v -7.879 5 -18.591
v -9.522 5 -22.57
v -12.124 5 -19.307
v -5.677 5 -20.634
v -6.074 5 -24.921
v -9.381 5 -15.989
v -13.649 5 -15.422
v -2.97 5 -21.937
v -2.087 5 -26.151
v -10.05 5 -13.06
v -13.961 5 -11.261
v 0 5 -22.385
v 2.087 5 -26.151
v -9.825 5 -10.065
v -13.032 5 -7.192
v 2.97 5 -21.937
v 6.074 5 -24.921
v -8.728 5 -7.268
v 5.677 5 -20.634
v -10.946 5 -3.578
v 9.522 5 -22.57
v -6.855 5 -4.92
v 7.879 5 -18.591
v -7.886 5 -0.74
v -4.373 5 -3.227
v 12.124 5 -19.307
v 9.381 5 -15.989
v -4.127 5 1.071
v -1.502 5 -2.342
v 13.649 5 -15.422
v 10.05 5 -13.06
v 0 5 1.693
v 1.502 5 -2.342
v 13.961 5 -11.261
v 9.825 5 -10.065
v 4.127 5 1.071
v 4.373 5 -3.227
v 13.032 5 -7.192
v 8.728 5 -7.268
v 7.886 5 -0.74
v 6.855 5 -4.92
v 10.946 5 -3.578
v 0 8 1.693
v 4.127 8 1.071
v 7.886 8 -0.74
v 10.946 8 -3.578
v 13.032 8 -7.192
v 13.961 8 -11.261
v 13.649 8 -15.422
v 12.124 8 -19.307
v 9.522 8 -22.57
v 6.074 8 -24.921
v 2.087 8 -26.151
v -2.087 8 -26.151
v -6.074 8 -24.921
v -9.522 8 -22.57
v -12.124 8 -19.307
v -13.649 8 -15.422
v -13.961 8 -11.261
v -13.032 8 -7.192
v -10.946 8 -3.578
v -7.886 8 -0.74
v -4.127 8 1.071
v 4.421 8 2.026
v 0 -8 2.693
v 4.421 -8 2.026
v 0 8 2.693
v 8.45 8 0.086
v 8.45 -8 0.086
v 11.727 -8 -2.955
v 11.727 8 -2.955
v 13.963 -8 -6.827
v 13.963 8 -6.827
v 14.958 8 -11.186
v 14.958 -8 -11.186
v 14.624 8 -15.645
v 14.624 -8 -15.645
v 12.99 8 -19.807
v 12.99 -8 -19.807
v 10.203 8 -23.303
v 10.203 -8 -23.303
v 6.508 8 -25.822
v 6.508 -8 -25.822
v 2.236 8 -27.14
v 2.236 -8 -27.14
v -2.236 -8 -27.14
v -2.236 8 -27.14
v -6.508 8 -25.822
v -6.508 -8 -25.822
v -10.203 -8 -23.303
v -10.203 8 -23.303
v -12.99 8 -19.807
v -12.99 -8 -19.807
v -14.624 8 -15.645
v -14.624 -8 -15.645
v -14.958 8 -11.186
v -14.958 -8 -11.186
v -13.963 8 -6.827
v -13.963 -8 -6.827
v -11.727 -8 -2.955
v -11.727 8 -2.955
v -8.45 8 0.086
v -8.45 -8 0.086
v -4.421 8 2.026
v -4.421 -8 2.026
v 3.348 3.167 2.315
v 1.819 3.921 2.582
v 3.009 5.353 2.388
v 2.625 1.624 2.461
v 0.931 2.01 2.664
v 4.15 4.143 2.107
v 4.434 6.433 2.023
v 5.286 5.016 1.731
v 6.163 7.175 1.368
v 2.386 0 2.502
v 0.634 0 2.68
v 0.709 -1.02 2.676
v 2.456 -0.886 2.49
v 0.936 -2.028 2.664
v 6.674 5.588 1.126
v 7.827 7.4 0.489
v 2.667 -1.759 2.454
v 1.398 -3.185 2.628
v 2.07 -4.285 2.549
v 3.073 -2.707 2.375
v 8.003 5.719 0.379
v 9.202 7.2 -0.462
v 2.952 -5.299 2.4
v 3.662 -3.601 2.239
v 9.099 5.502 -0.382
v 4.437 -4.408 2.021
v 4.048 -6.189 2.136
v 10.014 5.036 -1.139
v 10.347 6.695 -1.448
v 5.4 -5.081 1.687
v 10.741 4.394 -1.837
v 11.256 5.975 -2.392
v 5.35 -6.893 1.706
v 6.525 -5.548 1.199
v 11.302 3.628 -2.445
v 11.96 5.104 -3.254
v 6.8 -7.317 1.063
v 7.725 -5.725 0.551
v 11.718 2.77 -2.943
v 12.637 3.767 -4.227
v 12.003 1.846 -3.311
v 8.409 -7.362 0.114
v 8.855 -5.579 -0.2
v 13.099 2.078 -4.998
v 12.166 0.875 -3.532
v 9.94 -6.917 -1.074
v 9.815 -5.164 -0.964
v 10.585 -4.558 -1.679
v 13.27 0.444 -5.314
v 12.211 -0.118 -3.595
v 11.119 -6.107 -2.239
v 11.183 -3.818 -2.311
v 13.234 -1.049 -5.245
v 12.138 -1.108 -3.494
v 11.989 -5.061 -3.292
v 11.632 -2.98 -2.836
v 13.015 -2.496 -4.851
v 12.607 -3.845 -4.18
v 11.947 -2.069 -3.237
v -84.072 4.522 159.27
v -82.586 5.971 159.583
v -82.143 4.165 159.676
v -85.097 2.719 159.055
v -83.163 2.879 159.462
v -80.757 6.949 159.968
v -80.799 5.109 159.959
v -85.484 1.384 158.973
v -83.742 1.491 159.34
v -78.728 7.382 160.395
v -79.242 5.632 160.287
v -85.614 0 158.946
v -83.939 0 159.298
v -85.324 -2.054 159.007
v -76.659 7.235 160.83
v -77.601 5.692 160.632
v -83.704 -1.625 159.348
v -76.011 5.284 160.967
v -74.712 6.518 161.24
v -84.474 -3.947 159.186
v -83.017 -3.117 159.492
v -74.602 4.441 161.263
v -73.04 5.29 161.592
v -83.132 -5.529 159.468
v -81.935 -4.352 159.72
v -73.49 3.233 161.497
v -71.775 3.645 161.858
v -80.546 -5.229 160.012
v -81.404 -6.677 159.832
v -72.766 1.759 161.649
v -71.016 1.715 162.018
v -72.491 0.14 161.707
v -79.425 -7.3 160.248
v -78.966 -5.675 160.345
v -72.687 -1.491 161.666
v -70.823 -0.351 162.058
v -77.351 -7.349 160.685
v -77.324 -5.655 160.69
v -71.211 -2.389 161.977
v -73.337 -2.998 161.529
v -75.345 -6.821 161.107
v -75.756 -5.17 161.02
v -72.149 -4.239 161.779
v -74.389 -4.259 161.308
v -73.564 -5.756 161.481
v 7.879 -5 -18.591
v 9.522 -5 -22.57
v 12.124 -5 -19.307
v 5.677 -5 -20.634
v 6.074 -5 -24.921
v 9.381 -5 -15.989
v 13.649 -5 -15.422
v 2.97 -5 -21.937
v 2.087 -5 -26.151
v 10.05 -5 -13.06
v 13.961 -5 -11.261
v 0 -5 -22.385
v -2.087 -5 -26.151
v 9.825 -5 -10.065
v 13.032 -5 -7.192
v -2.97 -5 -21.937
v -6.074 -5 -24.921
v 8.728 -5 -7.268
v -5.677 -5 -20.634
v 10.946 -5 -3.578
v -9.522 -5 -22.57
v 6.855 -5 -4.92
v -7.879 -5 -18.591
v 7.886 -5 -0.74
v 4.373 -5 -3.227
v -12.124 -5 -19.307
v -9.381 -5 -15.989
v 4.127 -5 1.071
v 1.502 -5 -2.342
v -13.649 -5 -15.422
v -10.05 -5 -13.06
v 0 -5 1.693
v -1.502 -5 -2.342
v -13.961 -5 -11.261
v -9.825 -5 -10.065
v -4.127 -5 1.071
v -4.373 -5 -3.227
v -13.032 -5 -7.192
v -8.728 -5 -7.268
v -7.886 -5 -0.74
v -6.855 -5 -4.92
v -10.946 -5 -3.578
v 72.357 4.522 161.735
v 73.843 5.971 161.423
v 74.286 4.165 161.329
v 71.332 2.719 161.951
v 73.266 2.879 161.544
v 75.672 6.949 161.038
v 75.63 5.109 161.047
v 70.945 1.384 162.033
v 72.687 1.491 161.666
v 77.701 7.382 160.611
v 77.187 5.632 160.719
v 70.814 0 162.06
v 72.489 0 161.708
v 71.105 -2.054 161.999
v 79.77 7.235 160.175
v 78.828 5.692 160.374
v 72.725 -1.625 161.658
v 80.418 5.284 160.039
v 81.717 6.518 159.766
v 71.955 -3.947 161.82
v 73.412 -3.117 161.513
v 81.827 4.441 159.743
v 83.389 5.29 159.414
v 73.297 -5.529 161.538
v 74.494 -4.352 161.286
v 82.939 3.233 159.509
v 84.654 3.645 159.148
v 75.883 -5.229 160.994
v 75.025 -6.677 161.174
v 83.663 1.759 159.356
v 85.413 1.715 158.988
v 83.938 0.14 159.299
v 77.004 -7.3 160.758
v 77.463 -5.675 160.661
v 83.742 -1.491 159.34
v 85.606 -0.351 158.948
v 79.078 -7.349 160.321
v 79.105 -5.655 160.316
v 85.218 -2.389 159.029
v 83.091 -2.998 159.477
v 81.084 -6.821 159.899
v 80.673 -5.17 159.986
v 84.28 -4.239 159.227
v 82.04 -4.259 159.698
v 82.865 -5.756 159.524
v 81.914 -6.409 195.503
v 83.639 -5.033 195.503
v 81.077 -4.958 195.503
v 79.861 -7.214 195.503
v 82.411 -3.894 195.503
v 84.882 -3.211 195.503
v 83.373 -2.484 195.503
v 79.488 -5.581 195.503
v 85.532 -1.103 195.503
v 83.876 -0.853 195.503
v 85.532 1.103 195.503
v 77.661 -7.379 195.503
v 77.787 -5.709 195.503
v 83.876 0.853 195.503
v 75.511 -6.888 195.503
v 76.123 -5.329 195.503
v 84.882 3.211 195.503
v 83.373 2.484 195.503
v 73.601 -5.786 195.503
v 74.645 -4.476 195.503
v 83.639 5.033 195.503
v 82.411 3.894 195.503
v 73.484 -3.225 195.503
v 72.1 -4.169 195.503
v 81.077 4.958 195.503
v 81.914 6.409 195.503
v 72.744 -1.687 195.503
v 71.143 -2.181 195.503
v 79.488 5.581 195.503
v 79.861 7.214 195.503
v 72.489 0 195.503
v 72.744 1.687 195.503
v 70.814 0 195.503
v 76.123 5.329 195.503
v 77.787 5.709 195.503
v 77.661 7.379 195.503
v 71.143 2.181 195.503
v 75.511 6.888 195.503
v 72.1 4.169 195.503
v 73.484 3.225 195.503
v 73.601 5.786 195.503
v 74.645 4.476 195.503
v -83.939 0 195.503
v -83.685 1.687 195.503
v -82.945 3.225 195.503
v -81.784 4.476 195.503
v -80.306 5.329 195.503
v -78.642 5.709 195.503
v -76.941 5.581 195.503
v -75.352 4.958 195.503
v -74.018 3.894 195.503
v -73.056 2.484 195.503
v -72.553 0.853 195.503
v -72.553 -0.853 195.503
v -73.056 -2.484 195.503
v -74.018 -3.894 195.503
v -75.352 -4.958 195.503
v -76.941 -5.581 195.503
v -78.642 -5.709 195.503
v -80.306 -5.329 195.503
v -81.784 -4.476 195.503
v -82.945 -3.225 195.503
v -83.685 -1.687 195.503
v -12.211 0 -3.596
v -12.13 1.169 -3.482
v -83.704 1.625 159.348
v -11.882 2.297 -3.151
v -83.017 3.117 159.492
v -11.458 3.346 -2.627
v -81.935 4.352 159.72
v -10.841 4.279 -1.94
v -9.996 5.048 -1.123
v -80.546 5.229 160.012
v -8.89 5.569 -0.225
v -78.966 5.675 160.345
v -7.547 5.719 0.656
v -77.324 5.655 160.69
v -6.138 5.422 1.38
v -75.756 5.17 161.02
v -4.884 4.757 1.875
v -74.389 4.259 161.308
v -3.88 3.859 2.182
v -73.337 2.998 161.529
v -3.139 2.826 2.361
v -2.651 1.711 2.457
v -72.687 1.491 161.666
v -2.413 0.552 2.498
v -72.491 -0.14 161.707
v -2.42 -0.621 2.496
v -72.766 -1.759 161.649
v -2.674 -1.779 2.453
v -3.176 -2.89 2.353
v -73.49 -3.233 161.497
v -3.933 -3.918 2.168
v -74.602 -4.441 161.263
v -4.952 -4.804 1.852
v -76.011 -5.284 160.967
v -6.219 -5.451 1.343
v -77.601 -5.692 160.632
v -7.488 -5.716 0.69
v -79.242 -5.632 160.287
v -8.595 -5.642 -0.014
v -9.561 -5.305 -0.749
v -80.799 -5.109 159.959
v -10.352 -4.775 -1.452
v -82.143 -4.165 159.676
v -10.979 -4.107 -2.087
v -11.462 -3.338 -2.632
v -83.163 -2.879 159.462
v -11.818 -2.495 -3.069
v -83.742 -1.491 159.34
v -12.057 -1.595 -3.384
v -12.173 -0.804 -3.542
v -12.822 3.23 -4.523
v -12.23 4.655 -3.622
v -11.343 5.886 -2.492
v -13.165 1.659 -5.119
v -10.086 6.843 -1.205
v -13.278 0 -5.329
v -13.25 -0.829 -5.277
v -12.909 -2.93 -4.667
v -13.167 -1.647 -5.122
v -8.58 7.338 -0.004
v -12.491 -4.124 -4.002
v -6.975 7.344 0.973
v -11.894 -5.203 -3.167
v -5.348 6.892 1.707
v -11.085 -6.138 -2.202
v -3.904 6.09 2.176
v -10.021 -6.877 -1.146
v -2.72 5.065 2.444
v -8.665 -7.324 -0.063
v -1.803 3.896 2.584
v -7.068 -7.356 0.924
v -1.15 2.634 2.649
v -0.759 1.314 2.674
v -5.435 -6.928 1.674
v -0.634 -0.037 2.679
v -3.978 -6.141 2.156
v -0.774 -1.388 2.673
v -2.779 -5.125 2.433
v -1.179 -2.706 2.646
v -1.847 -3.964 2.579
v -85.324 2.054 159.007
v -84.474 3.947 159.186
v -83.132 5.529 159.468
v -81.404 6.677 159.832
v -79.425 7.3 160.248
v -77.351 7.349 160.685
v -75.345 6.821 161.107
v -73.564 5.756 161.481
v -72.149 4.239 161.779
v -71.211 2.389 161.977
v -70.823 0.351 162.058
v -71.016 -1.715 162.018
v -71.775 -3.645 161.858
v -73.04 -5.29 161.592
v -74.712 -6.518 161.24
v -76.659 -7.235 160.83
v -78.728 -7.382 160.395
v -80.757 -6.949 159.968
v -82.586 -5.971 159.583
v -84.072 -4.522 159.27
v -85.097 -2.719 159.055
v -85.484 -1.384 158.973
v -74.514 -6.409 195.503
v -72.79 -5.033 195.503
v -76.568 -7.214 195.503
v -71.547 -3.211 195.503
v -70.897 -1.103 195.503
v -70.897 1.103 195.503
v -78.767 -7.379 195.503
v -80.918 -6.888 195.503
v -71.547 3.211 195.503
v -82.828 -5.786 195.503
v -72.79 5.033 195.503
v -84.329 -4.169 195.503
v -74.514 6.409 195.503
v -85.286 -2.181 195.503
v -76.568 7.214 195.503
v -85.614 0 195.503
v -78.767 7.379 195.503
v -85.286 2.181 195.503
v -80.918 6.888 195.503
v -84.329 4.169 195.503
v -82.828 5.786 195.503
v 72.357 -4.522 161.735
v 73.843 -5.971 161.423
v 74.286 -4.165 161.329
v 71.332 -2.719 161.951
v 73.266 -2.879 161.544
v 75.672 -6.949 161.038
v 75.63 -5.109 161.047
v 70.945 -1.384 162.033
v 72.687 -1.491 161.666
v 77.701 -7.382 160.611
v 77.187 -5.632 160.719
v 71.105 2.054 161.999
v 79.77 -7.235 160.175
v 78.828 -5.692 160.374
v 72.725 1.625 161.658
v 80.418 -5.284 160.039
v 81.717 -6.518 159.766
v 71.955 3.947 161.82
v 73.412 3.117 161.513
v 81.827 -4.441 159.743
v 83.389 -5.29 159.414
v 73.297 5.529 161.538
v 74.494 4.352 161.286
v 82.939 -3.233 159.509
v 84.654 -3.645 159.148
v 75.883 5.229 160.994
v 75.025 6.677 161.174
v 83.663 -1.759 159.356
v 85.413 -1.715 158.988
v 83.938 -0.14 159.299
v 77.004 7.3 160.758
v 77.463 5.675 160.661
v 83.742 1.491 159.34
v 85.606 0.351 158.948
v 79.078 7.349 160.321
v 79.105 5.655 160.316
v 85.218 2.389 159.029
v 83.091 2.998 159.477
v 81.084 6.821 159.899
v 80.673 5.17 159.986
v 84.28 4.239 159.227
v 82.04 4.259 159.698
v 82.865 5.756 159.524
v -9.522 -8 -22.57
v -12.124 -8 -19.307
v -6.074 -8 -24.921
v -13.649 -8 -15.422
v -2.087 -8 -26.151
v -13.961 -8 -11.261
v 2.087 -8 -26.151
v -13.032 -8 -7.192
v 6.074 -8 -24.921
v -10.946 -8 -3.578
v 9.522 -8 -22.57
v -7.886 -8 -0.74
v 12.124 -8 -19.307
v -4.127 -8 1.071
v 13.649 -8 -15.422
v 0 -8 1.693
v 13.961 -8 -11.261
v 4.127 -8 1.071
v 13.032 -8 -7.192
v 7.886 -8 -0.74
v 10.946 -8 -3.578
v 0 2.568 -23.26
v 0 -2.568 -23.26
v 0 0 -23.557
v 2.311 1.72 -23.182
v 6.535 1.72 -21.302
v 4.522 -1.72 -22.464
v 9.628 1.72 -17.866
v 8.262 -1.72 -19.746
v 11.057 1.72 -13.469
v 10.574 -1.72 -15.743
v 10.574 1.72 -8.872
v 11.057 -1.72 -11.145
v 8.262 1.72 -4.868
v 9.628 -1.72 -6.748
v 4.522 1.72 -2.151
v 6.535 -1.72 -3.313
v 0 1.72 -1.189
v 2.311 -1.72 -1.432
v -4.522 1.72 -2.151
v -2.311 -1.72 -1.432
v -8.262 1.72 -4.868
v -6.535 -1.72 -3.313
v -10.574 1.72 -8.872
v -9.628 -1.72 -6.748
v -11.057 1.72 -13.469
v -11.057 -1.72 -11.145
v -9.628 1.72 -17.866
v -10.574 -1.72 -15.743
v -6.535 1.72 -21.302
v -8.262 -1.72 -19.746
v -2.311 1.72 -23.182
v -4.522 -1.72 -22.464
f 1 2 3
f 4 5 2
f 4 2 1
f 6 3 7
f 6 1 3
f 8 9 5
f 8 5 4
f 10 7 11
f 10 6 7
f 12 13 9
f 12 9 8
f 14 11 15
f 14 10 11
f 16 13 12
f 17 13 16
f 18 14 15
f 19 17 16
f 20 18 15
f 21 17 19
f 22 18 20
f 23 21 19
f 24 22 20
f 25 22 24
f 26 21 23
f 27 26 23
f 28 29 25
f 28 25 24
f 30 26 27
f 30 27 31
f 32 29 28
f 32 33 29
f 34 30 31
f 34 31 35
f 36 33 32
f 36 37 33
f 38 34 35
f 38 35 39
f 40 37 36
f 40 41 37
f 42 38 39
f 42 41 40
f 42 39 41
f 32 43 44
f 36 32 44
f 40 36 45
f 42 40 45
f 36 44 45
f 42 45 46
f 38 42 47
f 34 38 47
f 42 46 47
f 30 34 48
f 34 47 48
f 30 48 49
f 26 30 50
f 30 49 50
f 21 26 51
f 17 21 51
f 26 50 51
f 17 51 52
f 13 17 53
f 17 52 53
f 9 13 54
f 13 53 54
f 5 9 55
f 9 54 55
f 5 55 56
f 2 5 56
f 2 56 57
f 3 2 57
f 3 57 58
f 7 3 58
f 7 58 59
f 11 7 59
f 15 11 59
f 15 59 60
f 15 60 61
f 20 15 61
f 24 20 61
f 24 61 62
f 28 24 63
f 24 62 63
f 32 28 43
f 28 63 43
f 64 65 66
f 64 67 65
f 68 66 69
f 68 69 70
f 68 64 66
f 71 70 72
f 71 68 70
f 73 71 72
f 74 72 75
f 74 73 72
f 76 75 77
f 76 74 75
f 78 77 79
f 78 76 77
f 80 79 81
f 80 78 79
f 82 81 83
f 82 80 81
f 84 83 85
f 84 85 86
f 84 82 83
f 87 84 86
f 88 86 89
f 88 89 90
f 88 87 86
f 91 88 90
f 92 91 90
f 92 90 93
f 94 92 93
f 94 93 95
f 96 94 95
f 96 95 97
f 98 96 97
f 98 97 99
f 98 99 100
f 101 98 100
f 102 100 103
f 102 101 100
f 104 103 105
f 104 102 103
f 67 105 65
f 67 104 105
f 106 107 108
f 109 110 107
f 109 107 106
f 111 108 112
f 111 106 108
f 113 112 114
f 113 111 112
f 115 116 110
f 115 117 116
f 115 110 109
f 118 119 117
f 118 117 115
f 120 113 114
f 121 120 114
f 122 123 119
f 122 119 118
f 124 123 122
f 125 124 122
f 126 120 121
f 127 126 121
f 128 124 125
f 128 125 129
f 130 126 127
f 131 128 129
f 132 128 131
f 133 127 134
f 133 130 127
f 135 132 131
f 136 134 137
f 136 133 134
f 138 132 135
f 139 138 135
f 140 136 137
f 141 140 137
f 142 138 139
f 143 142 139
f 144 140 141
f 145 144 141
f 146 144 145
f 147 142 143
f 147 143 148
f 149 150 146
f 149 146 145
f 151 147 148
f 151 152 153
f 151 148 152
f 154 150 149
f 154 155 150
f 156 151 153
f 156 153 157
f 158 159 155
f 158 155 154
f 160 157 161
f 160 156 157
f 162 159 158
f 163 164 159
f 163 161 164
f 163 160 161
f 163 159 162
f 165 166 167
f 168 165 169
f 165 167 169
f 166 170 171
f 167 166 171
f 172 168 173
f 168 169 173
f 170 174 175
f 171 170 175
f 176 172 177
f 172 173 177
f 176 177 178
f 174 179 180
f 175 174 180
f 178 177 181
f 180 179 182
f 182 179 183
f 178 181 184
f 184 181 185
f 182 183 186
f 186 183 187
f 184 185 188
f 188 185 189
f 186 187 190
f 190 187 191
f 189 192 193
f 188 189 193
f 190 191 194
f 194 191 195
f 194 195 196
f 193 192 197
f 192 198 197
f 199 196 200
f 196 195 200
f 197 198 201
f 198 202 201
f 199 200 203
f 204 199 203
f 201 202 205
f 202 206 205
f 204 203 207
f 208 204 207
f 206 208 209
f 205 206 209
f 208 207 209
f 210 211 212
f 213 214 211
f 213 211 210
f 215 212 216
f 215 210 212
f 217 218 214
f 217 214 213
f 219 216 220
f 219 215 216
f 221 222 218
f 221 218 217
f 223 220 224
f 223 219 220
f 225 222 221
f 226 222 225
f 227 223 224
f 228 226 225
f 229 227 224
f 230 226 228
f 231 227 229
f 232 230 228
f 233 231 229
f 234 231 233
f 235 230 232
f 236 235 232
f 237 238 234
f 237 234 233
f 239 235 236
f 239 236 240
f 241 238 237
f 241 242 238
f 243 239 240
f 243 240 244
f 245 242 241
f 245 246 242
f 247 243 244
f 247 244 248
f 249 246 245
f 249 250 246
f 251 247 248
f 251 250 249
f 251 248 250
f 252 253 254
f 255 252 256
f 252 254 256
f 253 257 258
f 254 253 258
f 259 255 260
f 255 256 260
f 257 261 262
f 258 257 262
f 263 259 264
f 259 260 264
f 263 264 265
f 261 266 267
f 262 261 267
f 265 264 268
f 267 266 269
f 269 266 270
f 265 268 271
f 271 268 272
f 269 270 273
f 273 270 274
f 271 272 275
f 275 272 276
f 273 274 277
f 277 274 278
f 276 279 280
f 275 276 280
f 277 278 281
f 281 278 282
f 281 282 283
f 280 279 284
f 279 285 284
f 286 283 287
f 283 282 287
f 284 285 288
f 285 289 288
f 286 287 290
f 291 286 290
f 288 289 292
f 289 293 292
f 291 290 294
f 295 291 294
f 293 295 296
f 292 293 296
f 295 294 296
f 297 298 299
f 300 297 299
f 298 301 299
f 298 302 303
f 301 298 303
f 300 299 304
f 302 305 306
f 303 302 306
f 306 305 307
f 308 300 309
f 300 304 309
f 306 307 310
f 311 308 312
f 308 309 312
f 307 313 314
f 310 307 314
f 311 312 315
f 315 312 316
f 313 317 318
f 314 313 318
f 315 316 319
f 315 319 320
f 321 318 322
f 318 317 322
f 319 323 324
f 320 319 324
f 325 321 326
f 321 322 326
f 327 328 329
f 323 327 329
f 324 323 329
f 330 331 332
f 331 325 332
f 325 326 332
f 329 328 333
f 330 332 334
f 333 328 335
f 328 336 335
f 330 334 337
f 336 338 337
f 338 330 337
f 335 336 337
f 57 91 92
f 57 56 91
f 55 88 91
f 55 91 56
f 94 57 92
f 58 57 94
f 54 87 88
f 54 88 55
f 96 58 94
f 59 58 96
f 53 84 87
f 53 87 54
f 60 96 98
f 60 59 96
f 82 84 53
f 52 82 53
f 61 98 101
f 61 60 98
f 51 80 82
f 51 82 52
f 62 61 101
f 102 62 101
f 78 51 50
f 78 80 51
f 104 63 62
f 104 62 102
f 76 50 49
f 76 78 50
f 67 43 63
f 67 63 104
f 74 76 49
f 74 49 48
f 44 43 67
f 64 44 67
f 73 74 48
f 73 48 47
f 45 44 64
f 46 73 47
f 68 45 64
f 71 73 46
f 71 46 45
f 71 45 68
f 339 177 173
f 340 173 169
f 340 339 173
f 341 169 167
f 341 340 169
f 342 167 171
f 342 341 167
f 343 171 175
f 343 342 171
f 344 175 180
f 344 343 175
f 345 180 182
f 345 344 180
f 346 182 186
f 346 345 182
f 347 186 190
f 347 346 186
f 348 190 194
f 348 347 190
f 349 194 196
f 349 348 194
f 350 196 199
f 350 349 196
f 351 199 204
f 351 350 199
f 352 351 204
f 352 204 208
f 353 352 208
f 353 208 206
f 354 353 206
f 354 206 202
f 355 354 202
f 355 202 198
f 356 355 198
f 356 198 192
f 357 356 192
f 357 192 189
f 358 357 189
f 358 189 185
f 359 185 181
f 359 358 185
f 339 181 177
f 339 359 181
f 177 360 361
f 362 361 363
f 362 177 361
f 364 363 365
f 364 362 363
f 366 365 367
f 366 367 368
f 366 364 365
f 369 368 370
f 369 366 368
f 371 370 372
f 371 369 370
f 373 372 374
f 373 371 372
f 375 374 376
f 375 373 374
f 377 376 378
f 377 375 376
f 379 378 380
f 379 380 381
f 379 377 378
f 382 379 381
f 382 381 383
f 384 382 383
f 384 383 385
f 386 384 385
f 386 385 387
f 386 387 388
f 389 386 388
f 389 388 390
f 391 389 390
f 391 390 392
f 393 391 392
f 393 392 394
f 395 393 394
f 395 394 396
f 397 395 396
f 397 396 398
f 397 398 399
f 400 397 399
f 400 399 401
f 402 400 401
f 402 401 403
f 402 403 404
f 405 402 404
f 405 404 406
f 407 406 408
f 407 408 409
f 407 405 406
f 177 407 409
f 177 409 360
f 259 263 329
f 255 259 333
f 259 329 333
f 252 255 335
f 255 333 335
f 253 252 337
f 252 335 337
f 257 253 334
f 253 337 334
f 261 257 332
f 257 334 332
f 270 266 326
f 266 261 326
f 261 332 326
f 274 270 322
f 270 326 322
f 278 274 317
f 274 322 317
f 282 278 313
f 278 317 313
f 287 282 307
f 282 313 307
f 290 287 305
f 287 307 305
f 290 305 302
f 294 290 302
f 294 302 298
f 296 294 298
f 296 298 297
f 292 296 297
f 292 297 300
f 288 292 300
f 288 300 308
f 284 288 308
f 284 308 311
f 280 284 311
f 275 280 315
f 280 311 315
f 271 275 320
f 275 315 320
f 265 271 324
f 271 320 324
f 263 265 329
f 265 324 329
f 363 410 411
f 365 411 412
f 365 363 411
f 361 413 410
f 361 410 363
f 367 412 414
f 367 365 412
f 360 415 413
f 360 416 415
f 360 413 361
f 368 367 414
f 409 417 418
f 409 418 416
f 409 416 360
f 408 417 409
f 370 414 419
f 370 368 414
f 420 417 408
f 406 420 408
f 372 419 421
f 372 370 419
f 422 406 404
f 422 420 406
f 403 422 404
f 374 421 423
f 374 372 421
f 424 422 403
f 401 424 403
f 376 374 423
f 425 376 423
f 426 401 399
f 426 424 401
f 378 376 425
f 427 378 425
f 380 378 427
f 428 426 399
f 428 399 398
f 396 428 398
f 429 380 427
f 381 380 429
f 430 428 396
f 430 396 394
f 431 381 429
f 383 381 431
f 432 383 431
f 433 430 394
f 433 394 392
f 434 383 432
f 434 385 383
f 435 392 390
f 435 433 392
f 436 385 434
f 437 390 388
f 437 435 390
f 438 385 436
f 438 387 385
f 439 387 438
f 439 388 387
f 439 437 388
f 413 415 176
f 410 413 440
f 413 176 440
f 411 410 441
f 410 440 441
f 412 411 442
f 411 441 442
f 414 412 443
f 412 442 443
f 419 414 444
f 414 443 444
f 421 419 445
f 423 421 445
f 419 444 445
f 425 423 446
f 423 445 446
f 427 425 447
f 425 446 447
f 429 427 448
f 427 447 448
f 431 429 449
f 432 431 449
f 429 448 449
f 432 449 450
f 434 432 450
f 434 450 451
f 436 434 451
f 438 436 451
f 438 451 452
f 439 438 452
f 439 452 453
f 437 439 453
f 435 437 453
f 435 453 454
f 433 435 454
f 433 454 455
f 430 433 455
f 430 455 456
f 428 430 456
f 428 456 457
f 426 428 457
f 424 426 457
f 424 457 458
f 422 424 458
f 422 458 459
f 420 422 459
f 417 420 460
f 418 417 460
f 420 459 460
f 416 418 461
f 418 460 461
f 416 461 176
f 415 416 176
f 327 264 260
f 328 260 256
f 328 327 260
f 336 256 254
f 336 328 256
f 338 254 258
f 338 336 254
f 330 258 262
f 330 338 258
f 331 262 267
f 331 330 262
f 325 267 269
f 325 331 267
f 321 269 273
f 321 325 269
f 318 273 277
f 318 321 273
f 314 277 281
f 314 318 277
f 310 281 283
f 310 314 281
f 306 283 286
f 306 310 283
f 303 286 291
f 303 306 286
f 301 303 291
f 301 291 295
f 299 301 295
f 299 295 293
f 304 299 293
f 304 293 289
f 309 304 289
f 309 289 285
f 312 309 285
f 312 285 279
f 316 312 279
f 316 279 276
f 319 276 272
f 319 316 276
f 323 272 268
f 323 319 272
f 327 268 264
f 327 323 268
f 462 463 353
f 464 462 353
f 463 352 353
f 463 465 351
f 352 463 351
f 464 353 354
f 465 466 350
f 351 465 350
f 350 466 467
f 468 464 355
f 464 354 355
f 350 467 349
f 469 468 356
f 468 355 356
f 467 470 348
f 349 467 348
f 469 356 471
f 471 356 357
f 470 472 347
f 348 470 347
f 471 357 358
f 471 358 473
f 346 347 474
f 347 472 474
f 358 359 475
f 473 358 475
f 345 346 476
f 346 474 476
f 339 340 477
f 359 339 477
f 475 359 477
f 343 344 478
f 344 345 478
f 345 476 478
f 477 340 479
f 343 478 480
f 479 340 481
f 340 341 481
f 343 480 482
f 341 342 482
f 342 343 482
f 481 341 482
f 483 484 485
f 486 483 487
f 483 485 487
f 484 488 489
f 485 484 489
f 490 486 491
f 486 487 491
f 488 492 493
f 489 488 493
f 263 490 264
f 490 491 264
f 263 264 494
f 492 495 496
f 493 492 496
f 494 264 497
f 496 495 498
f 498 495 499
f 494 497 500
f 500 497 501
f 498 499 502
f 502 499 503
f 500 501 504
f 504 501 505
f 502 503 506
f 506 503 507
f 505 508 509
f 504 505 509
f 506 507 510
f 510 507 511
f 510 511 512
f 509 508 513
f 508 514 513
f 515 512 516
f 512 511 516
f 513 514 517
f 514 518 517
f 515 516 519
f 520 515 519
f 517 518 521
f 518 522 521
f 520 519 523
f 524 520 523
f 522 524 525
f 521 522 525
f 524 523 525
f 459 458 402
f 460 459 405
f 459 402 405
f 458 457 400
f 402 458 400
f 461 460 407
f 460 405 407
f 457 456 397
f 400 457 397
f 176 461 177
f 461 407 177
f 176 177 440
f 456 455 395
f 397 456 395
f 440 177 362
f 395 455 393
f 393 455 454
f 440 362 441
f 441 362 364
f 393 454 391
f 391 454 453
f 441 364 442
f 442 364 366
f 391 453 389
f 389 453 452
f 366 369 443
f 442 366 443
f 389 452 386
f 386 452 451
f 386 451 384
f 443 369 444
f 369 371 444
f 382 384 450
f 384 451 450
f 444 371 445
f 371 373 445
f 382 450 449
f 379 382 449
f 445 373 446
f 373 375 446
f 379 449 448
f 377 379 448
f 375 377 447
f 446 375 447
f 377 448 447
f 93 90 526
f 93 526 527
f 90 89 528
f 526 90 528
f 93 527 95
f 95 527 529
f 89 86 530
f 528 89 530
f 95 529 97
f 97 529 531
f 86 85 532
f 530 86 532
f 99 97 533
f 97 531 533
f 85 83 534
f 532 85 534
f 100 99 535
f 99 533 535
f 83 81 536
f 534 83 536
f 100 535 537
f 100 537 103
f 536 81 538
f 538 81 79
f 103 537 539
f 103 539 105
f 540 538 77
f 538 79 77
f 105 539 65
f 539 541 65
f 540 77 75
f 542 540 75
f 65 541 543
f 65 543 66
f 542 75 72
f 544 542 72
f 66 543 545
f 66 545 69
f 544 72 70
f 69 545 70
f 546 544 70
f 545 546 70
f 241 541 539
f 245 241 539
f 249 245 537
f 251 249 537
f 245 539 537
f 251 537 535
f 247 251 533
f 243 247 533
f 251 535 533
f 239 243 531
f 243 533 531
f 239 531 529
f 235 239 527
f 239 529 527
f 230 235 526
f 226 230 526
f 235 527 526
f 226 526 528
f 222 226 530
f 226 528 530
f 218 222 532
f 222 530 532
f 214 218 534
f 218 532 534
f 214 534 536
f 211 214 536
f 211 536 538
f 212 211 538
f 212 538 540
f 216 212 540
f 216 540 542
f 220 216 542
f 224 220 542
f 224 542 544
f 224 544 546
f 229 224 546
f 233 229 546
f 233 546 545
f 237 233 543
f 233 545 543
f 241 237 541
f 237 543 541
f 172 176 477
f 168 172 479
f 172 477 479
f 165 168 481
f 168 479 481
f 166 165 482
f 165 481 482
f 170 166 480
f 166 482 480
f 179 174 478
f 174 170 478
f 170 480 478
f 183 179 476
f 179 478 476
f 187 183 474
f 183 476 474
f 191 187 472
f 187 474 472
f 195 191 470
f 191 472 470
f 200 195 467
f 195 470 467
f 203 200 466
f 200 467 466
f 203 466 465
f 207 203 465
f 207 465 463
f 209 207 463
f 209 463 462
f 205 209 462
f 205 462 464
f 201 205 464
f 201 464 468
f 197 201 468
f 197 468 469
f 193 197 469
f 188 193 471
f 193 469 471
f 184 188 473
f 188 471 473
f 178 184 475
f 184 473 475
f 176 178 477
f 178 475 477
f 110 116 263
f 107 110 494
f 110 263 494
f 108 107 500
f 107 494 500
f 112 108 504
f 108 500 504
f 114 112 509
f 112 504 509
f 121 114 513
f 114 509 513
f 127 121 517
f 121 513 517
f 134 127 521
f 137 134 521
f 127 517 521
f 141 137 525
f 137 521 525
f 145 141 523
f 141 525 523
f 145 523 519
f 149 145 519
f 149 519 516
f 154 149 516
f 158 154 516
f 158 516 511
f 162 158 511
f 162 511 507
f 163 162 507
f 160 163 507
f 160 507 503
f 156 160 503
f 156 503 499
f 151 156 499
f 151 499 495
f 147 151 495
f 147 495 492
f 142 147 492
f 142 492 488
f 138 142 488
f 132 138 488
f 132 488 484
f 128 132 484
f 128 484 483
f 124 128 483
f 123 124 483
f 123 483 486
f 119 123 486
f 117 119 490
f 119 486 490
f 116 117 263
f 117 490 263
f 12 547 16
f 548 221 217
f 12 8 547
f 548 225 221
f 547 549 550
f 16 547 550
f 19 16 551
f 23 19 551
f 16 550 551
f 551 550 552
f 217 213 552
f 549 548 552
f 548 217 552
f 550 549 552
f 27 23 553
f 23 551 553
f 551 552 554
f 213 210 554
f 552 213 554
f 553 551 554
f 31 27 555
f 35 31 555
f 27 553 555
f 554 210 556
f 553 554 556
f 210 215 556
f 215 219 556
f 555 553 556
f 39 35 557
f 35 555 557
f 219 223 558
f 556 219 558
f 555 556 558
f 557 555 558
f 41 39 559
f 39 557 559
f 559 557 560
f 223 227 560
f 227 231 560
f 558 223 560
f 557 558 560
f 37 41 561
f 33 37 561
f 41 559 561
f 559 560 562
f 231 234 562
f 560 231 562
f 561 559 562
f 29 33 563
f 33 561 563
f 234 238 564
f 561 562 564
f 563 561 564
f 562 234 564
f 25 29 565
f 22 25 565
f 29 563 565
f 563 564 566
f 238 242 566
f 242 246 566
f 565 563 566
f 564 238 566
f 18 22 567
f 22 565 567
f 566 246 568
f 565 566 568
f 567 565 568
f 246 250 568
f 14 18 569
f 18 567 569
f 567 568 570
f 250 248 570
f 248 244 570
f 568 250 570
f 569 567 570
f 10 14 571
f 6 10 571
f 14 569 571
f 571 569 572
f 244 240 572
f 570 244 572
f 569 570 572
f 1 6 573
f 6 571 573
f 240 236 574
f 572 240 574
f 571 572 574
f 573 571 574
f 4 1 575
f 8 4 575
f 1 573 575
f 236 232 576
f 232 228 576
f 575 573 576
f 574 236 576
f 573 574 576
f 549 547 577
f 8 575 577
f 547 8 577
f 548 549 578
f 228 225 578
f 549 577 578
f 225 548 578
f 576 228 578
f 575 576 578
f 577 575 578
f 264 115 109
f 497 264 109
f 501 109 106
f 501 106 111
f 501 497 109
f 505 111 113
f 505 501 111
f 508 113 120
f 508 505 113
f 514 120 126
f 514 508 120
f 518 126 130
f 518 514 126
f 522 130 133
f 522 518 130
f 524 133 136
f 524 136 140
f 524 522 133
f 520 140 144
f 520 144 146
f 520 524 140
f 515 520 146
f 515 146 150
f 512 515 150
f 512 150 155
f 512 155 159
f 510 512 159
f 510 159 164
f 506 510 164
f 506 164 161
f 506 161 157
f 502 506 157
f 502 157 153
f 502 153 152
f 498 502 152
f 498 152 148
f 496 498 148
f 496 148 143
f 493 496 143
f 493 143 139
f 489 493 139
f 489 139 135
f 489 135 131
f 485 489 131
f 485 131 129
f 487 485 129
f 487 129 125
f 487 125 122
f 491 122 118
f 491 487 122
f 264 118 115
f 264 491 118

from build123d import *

# Parameters (mm, degrees)
SKETCH1_ON_SEGMENT_1_R                  = 7.4
SKETCH1_ON_SEGMENT_1_R_2                = 5.725
CIRCULAR_TUBE_21_3_X_2_3_1_DEPTH        = 38.202079732
CIRCULAR_TUBE_21_3_X_2_3_1_2_DEPTH      = 178.412650039
CIRCULAR_TUBE_21_3_X_2_3_1_2_DEPTH_BACK = 3.202079732
SKETCH1_R                               = 7.4
SKETCH1_R_2                             = 5.725
SKETCH11_ON_SEGMENT_1_R                 = 7.4
SKETCH11_ON_SEGMENT_1_R_2               = 5.725
CIRCULAR_TUBE_21_3_X_2_3_2_DEPTH        = 38.202079732
CIRCULAR_TUBE_21_3_X_2_3_2_2_DEPTH      = 178.412650039
CIRCULAR_TUBE_21_3_X_2_3_2_2_DEPTH_BACK = 3.202079732
SKETCH11_R                              = 7.4
SKETCH11_R_2                            = 5.725
SKETCH_1_R                              = 15
EXTRUDE_1_DEPTH                         = 8
SKETCH_5_R                              = 14
CUT_EXTRUDE_1_DEPTH                     = 3
SKETCH_7_R                              = 14
CUT_EXTRUDE_2_DEPTH                     = 3
WELD_START                              = -8
WELD_TRIM_4_DEPTH                       = 16
WELD_TRIM_4_2_DEPTH                     = 16


with BuildPart() as part:
    # Sketch1 on segment 1 (carried to segment 1) → Circular tube 21.3 X 2.3(1) (new body)
    with BuildSketch(Plane(origin=(-78.21449332, 0, 195.502886979), x_dir=(-1, 0, 0), z_dir=(0, 0, -1))):
        Circle(SKETCH1_ON_SEGMENT_1_R)
        Circle(SKETCH1_ON_SEGMENT_1_R_2, mode=Mode.SUBTRACT)
    extrude(amount=CIRCULAR_TUBE_21_3_X_2_3_1_DEPTH)

    # Circular tube 21.3 X 2.3(1) mitre 1
    split(bisect_by=Plane(origin=(-78.21449332, 0, 160.502886979), x_dir=(0, -1, 0), z_dir=(-0.205910543, 0, 0.978570819)), keep=Keep.TOP)


with BuildPart() as body_2:
    # Sketch1 → Circular tube 21.3 X 2.3_1 2 (new, two sides: drawn at the far end of the back side and taken through both)
    with BuildSketch(Plane(origin=(-78.21449332, 0, 160.502886979), x_dir=(-0.9152016968098962, 0, -0.4029960969491974), z_dir=(0.4029960969491974, 0, -0.9152016968098962)).offset(-CIRCULAR_TUBE_21_3_X_2_3_1_2_DEPTH_BACK)):
        Circle(SKETCH1_R)
        Circle(SKETCH1_R_2, mode=Mode.SUBTRACT)
    extrude(amount=CIRCULAR_TUBE_21_3_X_2_3_1_2_DEPTH + CIRCULAR_TUBE_21_3_X_2_3_1_2_DEPTH_BACK)

    # Circular tube 21.3 X 2.3_1 2 mitre 1
    split(bisect_by=Plane(origin=(-78.21449332, 0, 160.502886979), x_dir=(0, 1, 0), z_dir=(0.205910543, 0, -0.978570819)), keep=Keep.TOP)


with BuildPart() as body_3:
    # Sketch11 on segment 1 (carried to segment 1) → Circular tube 21.3 X 2.3(2) (new body)
    with BuildSketch(Plane(origin=(78.21449332, 0, 195.502886979), x_dir=(-1, 0, 0), z_dir=(0, 0, -1))):
        Circle(SKETCH11_ON_SEGMENT_1_R)
        Circle(SKETCH11_ON_SEGMENT_1_R_2, mode=Mode.SUBTRACT)
    extrude(amount=CIRCULAR_TUBE_21_3_X_2_3_2_DEPTH)

    # Circular tube 21.3 X 2.3(2) mitre 1
    split(bisect_by=Plane(origin=(78.21449332, 0, 160.502886979), x_dir=(0, -1, 0), z_dir=(0.205910543, 0, 0.978570819)), keep=Keep.TOP)


with BuildPart() as body_4:
    # Sketch11 → Circular tube 21.3 X 2.3_2 2 (new, two sides: drawn at the far end of the back side and taken through both)
    with BuildSketch(Plane(origin=(78.21449332, 0, 160.502886979), x_dir=(-0.9152016968098962, 0, 0.40299609694919775), z_dir=(-0.40299609694919775, 0, -0.9152016968098962)).offset(-CIRCULAR_TUBE_21_3_X_2_3_2_2_DEPTH_BACK)):
        Circle(SKETCH11_R)
        Circle(SKETCH11_R_2, mode=Mode.SUBTRACT)
    extrude(amount=CIRCULAR_TUBE_21_3_X_2_3_2_2_DEPTH + CIRCULAR_TUBE_21_3_X_2_3_2_2_DEPTH_BACK)

    # Circular tube 21.3 X 2.3_2 2 mitre 1
    split(bisect_by=Plane(origin=(78.21449332, 0, 160.502886979), x_dir=(0, 1, 0), z_dir=(-0.205910543, 0, -0.978570819)), keep=Keep.TOP)


with BuildPart() as body_5:
    # 스케치1 → 보스-돌출1 (new, symmetric)
    with BuildSketch(Plane(origin=(0, 0, 0), x_dir=(1, 0, 0), z_dir=(0, 1, 0))):
        with Locations(Location((0, 12.307113021, 0), (0, 0, 270))):
            Circle(SKETCH_1_R)
    extrude(amount=EXTRUDE_1_DEPTH, both=True)


with BuildPart() as cut_extrude_1_tool:
    # 스케치5 → 컷-돌출1 (new body)
    with BuildSketch(Plane(origin=(0, 8, 0), x_dir=(1, 0, 0), z_dir=(0, 1, 0))):
        with Locations(Location((0, 12.307113021, 0), (0, 0, 270))):
            Circle(SKETCH_5_R)
    extrude(amount=-CUT_EXTRUDE_1_DEPTH)


with BuildPart() as body_2_1:
    add(body_2.part)

    # 컷-돌출1: cut by cut_extrude_1_tool
    add(cut_extrude_1_tool.part, mode=Mode.SUBTRACT)


with BuildPart() as body_4_1:
    add(body_4.part)

    # 컷-돌출1: cut by cut_extrude_1_tool
    add(cut_extrude_1_tool.part, mode=Mode.SUBTRACT)


with BuildPart() as body_5_1:
    add(body_5.part)

    # 컷-돌출1: cut by cut_extrude_1_tool
    add(cut_extrude_1_tool.part, mode=Mode.SUBTRACT)


with BuildPart() as cut_extrude_2_tool:
    # 스케치7 → 컷-돌출2 (new body)
    with BuildSketch(Plane.XZ.offset(8)):
        with Locations(Location((0, -12.307113021, 0), (0, 0, 90))):
            Circle(SKETCH_7_R)
    extrude(amount=-CUT_EXTRUDE_2_DEPTH)


with BuildPart() as body_2_2:
    add(body_2_1.part)

    # 컷-돌출2: cut by cut_extrude_2_tool
    add(cut_extrude_2_tool.part, mode=Mode.SUBTRACT)

    # Weld Trim 4 2 outline → Weld Trim 4 2 (cut)
    with BuildSketch(Plane(origin=(0, 0, 0), x_dir=(1, 0, 0), z_dir=(0, 1, 0)).offset(WELD_START)):
        with BuildLine():
            ThreePointArc((-13.278559815, 5.330018407), (-8.02650701, -0.364713415), (-0.633551868, -2.679501408))
            Line((-0.633551868, -2.679501408), (2, -2.790833538))
            Line((2, -2.790833538), (2, -0.880671656))
            Line((2, -0.880671656), (0.457600848, -0.201498048))
            Line((0.457600848, -0.201498048), (-3.762869377, 1.656926203))
            Line((-3.762869377, 1.656926203), (-8.866914039, 3.904419935))
            Line((-8.866914039, 3.904419935), (-13.087384264, 5.762844186))
            Line((-13.087384264, 5.762844186), (-13.631989565, 6.002653412))
            Line((-13.631989565, 6.002653412), (-13.278559815, 5.330018407))
        make_face()
    extrude(amount=WELD_TRIM_4_2_DEPTH, mode=Mode.SUBTRACT)


with BuildPart() as body_4_2:
    add(body_4_1.part)

    # 컷-돌출2: cut by cut_extrude_2_tool
    add(cut_extrude_2_tool.part, mode=Mode.SUBTRACT)

    # Weld Trim 4: read off the stored shape, not the designer's step
    # Weld Trim 4 outline → Weld Trim 4 (cut)
    with BuildSketch(Plane(origin=(0, 0, 0), x_dir=(1, 0, 0), z_dir=(0, 1, 0)).offset(WELD_START)):
        with BuildLine():
            ThreePointArc((0.632975611, -2.679525758), (8.025973922, -0.365051065), (13.278241052, 5.329411783))
            Line((13.278241052, 5.329411783), (13.632040607, 6.002675888))
            Line((13.632040607, 6.002675888), (13.087384264, 5.762844186))
            Line((13.087384264, 5.762844186), (8.866914039, 3.904419935))
            Line((8.866914039, 3.904419935), (3.762869377, 1.656926203))
            Line((3.762869377, 1.656926203), (-0.457600848, -0.201498048))
            Line((-0.457600848, -0.201498048), (-2, -0.880671656))
            Line((-2, -0.880671656), (-2, -2.790732104))
            Line((-2, -2.790732104), (0.632975611, -2.679525758))
        make_face()
    extrude(amount=WELD_TRIM_4_DEPTH, mode=Mode.SUBTRACT)


with BuildPart() as body_5_2:
    add(body_5_1.part)

    # 컷-돌출2: cut by cut_extrude_2_tool
    add(cut_extrude_2_tool.part, mode=Mode.SUBTRACT)

    # 스케치9 → 컷-회전1 (revolve, cut)
    with BuildSketch(Plane(origin=(0, 0, 0), x_dir=(0, 0, -1), z_dir=(1, 0, 0))):
        with BuildLine():
            Line((12.307113021, -11.25), (12.307113021, 11.25))
            ThreePointArc((12.307113021, 11.25), (23.557113021, 0), (12.307113021, -11.25))
        make_face()
    revolve(axis=Axis((0, 8, -12.307113021), (0, -1, 0)), mode=Mode.SUBTRACT)


solid = Compound([part.part, body_3.part, body_2_2.part, body_4_2.part, body_5_2.part])
